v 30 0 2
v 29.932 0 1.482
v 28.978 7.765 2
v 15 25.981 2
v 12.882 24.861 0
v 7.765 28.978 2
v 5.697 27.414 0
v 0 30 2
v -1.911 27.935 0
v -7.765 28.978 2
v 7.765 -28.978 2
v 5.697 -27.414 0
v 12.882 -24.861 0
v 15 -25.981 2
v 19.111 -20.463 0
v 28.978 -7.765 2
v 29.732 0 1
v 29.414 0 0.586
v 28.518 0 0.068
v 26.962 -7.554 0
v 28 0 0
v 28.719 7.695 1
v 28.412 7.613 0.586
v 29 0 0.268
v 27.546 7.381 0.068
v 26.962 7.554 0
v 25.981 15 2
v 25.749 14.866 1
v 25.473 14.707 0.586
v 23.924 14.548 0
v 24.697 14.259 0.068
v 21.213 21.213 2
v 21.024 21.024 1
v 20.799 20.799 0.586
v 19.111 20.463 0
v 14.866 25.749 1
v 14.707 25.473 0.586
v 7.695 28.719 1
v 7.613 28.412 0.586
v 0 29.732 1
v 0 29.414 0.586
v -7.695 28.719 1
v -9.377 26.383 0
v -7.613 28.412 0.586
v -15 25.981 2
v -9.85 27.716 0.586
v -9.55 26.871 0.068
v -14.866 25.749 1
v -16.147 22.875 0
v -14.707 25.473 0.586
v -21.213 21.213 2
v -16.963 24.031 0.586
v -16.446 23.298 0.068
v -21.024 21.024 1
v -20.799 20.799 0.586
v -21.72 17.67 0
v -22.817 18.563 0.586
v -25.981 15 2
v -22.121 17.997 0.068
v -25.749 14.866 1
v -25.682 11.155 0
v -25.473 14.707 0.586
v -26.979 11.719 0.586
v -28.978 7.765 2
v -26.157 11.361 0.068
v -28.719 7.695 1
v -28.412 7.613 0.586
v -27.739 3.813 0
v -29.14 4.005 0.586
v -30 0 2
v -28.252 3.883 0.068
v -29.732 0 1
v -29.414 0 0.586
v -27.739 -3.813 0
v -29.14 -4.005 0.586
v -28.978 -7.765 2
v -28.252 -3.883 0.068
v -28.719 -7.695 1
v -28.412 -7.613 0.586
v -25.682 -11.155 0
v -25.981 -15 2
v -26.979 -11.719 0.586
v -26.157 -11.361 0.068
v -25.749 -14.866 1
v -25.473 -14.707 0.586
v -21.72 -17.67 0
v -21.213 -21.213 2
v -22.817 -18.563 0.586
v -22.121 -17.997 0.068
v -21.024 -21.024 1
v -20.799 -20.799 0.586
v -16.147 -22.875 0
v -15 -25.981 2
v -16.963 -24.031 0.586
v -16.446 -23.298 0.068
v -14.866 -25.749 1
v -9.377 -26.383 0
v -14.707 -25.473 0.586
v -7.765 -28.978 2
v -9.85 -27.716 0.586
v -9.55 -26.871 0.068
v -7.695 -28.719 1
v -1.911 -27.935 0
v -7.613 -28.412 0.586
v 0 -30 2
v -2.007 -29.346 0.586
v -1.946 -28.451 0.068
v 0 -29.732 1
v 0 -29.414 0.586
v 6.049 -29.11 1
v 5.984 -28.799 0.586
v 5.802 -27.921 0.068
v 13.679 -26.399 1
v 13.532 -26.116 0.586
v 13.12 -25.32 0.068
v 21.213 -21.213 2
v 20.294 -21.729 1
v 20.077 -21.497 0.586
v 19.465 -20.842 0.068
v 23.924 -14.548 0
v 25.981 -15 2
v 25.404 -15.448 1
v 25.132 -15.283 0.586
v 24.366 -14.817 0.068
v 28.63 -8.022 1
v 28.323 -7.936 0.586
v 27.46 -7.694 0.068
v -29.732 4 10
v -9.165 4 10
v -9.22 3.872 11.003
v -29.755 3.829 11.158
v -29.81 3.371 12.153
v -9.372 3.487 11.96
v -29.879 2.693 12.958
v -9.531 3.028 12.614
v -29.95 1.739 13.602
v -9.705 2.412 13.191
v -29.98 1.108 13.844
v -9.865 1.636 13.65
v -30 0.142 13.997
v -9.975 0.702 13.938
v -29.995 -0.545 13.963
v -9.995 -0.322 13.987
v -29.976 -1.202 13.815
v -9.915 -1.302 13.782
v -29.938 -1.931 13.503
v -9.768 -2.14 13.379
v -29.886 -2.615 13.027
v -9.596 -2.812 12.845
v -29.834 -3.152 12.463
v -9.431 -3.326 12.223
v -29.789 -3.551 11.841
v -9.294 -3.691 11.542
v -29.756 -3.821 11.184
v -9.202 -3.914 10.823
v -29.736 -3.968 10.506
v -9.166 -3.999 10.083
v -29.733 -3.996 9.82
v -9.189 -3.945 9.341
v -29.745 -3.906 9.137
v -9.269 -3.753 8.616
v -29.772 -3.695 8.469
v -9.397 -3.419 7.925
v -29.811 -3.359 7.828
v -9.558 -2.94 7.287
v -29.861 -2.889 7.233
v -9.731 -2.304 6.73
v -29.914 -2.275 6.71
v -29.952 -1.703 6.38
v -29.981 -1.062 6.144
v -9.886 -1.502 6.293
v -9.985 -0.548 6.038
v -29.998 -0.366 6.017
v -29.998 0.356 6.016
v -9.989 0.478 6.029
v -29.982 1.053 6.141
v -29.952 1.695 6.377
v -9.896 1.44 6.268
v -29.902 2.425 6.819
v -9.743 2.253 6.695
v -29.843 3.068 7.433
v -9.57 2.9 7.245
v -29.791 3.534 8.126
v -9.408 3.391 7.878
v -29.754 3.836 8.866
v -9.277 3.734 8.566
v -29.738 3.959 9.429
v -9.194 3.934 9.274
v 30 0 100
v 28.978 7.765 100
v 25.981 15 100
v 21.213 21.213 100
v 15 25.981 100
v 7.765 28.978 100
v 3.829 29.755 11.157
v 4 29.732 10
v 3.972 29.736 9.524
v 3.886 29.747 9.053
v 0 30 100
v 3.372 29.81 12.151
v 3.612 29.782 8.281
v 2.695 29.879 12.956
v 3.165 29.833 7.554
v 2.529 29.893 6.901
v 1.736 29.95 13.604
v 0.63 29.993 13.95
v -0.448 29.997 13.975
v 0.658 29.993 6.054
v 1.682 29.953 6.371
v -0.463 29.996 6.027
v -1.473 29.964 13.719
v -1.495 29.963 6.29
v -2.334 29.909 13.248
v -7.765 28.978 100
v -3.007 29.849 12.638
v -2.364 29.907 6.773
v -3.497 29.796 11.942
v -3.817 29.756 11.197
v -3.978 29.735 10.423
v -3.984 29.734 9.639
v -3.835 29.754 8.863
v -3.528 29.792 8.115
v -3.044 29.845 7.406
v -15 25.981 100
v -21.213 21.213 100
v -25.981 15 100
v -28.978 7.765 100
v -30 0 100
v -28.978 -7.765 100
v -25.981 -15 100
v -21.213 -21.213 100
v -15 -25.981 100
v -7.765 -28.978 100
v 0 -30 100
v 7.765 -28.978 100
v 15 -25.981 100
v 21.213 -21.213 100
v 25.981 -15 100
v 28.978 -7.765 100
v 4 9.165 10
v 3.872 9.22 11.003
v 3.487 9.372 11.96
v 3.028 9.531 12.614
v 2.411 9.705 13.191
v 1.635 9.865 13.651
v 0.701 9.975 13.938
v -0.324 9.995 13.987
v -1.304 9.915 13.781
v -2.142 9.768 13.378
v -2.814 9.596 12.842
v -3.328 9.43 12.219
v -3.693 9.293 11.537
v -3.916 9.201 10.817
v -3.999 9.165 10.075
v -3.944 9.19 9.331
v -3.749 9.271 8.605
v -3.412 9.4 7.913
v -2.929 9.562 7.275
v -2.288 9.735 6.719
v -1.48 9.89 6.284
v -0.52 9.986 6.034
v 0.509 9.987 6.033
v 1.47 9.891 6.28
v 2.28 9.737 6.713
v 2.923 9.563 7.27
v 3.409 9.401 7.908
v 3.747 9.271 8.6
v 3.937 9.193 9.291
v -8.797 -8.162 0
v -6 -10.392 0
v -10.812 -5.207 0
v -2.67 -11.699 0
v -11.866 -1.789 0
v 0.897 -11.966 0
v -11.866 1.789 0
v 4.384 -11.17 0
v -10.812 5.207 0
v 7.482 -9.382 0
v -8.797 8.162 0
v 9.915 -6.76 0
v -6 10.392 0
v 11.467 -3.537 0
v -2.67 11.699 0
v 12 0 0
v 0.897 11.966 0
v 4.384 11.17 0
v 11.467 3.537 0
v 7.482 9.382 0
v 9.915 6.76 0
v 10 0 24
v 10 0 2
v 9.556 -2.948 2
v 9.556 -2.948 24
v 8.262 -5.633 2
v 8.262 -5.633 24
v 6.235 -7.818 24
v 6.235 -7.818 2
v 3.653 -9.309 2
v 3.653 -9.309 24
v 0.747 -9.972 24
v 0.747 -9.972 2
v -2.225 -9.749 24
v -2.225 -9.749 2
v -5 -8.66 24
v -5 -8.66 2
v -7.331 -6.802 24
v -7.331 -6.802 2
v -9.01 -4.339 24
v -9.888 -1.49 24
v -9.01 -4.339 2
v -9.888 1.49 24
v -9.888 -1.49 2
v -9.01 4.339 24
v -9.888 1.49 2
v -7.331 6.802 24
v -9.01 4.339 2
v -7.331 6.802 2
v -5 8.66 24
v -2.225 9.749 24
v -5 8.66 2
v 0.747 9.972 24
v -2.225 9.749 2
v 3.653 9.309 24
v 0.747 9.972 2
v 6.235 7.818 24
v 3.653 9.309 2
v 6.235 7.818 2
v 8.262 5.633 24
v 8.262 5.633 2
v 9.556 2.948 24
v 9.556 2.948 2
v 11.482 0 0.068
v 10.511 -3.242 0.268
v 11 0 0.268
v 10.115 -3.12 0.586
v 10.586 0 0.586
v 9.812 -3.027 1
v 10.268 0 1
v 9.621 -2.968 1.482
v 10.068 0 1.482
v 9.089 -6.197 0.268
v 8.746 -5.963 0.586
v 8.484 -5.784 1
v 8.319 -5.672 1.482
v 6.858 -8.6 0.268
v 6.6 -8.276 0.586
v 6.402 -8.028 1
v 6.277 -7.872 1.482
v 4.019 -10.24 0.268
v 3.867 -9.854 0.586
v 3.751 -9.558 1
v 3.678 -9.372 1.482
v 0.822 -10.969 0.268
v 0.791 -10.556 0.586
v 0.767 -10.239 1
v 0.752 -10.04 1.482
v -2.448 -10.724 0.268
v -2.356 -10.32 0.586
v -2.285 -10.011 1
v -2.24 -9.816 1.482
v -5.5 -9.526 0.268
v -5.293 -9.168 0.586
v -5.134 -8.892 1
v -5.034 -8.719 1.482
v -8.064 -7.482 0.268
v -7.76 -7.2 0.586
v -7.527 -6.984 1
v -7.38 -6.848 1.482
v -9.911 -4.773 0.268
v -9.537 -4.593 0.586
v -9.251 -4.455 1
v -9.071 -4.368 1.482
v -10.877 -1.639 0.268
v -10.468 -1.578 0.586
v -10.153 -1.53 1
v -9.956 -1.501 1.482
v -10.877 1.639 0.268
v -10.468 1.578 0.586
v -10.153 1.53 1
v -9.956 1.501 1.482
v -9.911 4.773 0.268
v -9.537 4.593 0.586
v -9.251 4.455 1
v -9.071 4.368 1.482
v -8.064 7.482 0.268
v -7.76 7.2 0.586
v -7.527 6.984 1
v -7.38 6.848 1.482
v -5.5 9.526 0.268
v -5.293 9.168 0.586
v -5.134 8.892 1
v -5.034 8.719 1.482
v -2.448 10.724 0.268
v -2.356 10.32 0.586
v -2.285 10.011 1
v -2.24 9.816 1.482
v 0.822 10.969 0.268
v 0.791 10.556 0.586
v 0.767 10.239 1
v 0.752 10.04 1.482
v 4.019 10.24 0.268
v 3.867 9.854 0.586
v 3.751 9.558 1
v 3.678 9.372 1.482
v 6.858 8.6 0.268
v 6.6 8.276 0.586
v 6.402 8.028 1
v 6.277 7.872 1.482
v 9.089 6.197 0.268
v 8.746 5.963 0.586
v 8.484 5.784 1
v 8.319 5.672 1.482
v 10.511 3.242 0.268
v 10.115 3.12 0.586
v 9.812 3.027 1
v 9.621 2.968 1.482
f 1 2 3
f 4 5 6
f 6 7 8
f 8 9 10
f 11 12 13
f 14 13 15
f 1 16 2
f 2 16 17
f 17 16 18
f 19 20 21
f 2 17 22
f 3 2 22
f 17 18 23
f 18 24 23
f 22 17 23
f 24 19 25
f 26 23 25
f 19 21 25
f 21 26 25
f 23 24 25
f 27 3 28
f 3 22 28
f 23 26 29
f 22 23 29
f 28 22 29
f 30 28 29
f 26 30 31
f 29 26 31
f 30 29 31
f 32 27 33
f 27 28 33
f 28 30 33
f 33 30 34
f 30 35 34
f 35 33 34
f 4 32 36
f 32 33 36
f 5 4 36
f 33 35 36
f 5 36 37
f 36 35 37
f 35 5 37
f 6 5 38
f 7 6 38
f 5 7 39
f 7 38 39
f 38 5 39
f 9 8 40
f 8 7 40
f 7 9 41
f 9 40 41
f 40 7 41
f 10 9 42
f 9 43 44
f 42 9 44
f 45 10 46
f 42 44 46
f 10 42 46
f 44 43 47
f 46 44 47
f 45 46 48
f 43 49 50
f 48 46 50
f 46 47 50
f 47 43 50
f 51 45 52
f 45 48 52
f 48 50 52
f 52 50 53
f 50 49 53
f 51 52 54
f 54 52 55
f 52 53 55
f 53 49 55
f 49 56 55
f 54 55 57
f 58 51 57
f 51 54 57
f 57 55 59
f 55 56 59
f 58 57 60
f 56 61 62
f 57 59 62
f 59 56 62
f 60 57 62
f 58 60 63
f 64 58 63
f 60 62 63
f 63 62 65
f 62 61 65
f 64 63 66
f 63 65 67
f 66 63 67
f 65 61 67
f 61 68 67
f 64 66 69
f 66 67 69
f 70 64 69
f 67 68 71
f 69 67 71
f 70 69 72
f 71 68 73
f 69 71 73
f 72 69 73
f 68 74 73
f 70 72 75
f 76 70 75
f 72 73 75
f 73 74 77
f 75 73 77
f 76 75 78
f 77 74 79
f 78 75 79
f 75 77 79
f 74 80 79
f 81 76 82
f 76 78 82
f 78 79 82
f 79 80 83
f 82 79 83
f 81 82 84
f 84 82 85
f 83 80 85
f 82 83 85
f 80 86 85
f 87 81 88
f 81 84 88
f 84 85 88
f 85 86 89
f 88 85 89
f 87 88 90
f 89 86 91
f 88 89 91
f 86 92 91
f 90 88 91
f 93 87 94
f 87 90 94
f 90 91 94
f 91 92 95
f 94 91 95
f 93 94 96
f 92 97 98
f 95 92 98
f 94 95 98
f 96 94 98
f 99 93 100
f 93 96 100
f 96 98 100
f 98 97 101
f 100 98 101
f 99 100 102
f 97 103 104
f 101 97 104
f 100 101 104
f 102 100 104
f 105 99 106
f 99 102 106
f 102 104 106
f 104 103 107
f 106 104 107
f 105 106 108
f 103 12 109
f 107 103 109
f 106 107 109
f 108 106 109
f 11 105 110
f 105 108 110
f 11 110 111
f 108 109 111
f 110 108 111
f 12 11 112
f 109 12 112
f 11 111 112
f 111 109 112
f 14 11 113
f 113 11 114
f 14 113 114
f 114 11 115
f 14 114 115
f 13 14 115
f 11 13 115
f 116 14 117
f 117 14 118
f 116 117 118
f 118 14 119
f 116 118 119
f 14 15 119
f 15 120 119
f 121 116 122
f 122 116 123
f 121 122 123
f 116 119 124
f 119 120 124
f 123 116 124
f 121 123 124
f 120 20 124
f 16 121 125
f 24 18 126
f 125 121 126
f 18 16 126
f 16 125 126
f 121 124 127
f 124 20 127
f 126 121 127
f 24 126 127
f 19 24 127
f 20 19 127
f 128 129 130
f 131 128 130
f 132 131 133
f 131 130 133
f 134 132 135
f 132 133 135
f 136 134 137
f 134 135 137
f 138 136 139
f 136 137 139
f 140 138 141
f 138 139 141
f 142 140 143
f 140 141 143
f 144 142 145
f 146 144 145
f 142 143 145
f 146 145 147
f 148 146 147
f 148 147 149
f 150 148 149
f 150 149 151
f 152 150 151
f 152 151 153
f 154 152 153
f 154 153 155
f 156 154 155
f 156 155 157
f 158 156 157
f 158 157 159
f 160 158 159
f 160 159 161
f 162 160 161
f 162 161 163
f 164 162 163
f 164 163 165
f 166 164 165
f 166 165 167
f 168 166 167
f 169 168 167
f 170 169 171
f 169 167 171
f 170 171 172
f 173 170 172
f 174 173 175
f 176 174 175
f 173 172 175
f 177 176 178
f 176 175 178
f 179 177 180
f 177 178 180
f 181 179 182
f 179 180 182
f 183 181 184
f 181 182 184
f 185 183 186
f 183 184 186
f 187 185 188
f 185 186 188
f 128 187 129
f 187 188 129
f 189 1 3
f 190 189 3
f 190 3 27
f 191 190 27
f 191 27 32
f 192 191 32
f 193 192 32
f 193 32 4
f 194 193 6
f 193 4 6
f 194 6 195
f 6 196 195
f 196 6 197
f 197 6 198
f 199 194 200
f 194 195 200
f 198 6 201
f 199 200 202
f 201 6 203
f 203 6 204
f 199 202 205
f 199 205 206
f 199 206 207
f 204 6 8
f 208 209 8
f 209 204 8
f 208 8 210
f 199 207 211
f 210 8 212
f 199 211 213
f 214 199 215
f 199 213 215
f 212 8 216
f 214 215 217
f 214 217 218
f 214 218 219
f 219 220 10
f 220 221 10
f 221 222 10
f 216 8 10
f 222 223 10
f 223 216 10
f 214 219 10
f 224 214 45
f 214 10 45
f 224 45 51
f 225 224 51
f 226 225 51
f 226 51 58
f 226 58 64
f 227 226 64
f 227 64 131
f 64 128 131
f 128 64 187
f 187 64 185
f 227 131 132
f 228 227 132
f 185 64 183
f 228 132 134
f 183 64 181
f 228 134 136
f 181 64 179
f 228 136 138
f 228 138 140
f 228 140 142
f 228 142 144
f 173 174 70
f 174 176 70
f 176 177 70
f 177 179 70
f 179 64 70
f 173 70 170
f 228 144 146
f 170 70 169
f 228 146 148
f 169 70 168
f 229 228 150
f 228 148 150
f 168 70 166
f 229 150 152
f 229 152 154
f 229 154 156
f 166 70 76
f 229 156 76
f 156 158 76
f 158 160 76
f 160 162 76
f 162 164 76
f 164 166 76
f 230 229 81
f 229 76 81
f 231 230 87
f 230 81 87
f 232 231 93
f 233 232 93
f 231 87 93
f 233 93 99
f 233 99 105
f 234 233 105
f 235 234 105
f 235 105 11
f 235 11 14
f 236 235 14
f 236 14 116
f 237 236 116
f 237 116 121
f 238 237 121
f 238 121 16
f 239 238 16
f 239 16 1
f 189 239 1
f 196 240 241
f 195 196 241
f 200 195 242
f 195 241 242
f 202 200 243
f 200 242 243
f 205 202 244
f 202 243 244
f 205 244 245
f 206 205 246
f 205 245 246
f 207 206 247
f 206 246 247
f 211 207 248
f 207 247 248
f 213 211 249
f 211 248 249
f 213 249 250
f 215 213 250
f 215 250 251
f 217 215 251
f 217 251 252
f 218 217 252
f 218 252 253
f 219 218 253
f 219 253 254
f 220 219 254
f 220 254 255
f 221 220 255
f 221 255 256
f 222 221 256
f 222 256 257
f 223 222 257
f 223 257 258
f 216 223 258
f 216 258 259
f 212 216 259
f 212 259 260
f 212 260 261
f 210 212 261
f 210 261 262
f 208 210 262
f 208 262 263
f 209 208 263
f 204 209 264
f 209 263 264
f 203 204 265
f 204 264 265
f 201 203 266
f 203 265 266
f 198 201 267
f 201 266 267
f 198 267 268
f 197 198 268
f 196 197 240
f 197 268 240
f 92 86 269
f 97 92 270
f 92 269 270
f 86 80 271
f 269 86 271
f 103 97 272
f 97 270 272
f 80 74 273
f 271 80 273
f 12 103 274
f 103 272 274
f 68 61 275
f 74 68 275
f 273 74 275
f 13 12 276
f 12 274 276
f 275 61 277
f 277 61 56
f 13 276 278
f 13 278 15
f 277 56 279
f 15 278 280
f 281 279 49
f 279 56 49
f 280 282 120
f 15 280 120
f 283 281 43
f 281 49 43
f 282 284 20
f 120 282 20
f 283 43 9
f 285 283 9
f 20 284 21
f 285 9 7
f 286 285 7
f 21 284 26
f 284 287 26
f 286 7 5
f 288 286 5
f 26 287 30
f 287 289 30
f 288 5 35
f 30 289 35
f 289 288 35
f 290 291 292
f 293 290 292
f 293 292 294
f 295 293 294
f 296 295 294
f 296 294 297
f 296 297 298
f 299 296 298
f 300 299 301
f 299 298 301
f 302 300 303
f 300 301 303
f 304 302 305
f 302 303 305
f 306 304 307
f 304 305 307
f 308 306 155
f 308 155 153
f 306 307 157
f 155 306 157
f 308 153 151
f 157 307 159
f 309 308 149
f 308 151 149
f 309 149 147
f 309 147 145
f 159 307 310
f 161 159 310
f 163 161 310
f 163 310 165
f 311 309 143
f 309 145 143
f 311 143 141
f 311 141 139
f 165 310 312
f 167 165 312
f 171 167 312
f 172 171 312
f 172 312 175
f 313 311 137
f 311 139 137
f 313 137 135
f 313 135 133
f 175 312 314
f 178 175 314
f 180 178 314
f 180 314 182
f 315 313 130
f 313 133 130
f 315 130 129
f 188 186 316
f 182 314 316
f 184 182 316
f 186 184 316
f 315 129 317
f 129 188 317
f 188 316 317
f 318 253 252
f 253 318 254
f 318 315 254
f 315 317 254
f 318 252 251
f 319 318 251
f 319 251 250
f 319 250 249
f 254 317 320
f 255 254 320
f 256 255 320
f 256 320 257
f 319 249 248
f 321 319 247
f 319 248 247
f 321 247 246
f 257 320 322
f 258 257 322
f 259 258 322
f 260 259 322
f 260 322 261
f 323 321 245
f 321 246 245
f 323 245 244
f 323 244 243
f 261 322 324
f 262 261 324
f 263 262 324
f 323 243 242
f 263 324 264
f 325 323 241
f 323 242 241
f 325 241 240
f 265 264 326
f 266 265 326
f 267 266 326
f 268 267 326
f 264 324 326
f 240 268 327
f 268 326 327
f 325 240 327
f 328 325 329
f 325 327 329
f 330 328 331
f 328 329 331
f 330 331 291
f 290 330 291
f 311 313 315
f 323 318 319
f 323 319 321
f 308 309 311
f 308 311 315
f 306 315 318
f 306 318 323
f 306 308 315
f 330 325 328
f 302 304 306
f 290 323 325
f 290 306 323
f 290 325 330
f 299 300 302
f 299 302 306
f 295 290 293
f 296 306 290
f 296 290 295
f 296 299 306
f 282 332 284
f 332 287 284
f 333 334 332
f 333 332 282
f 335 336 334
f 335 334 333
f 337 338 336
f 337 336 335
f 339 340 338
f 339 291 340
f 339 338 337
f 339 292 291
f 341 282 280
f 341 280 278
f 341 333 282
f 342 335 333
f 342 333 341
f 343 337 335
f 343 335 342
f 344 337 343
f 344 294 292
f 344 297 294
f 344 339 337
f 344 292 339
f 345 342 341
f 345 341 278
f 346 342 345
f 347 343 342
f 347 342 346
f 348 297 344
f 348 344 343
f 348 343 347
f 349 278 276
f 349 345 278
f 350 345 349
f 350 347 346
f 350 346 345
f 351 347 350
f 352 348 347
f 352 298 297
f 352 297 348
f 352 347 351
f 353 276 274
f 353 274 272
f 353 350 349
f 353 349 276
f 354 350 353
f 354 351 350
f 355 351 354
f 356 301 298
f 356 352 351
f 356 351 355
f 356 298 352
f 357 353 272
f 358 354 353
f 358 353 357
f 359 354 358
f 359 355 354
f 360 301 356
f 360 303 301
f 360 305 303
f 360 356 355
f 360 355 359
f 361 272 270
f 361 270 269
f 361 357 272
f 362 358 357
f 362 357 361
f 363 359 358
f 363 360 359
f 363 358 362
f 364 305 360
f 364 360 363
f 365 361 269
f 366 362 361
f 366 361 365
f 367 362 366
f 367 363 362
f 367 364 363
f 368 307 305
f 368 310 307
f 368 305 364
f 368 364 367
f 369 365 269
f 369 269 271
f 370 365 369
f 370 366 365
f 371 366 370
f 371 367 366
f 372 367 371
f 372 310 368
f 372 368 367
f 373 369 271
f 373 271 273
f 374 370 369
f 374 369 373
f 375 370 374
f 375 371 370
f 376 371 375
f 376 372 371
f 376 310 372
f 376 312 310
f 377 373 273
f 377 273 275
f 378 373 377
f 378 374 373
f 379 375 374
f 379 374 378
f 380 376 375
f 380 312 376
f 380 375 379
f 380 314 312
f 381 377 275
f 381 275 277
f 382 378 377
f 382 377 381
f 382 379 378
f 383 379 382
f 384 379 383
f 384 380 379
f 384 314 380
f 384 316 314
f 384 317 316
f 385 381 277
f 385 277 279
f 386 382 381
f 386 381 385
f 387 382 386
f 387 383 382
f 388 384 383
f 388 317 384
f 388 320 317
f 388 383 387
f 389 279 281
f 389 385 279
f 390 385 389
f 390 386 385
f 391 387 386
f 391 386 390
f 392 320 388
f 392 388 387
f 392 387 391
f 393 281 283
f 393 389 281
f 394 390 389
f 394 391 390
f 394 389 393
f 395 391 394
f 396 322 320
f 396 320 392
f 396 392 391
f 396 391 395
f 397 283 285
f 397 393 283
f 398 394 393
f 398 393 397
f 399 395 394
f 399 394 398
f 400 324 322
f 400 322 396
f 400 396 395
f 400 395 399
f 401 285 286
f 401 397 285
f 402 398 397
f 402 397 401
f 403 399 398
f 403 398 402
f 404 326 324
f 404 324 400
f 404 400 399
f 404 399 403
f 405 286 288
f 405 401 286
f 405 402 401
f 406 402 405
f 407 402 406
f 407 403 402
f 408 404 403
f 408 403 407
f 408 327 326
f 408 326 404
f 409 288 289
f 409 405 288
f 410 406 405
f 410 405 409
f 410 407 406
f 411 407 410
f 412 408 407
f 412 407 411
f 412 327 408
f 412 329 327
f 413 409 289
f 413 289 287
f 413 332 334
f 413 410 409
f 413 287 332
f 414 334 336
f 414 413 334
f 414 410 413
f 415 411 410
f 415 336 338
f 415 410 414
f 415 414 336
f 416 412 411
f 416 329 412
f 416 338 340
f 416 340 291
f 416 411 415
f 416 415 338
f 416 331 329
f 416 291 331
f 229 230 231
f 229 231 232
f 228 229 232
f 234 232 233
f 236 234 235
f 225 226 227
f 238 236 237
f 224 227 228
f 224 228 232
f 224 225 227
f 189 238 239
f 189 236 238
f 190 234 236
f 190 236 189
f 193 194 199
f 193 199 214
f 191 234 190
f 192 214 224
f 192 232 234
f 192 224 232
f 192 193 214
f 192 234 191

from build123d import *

# Parameters (mm, degrees)
F0_R     = 30
F1_DEPTH = 100
F2_R     = 10
F3_DEPTH = 24
F4_R     = 2
F5_R     = 4
F6_DEPTH = 30
F7_R     = 4
F8_DEPTH = 30


with BuildPart() as f1:
    # F0 (on Top) → F1 (new body)
    with BuildSketch(Plane.XY):
        Circle(F0_R)
    extrude(amount=F1_DEPTH)

    # F2 (on face) → F3 (cut)
    with BuildSketch(Plane(origin=(0, 0, 0), x_dir=(1, 0, 0), z_dir=(0, 0, -1))):
        Circle(F2_R)
    extrude(amount=-F3_DEPTH, mode=Mode.SUBTRACT)

    # F4
    f4_edges = [f1.edges().sort_by_distance(p)[0] for p in [
        (-10, 0, 0),
        (-30, 0, 0),
    ]]
    fillet(f4_edges, radius=F4_R)

    # F5 (on Right) → F6 (cut)
    with BuildSketch(Plane.YZ):
        with Locations((0, 10)):
            Circle(F5_R)
    extrude(amount=-F6_DEPTH, mode=Mode.SUBTRACT)

    # F7 (on Front) → F8 (cut)
    with BuildSketch(Plane.XZ):
        with Locations((0, 10)):
            Circle(F7_R)
    extrude(amount=-F8_DEPTH, mode=Mode.SUBTRACT)


solid = f1.part
